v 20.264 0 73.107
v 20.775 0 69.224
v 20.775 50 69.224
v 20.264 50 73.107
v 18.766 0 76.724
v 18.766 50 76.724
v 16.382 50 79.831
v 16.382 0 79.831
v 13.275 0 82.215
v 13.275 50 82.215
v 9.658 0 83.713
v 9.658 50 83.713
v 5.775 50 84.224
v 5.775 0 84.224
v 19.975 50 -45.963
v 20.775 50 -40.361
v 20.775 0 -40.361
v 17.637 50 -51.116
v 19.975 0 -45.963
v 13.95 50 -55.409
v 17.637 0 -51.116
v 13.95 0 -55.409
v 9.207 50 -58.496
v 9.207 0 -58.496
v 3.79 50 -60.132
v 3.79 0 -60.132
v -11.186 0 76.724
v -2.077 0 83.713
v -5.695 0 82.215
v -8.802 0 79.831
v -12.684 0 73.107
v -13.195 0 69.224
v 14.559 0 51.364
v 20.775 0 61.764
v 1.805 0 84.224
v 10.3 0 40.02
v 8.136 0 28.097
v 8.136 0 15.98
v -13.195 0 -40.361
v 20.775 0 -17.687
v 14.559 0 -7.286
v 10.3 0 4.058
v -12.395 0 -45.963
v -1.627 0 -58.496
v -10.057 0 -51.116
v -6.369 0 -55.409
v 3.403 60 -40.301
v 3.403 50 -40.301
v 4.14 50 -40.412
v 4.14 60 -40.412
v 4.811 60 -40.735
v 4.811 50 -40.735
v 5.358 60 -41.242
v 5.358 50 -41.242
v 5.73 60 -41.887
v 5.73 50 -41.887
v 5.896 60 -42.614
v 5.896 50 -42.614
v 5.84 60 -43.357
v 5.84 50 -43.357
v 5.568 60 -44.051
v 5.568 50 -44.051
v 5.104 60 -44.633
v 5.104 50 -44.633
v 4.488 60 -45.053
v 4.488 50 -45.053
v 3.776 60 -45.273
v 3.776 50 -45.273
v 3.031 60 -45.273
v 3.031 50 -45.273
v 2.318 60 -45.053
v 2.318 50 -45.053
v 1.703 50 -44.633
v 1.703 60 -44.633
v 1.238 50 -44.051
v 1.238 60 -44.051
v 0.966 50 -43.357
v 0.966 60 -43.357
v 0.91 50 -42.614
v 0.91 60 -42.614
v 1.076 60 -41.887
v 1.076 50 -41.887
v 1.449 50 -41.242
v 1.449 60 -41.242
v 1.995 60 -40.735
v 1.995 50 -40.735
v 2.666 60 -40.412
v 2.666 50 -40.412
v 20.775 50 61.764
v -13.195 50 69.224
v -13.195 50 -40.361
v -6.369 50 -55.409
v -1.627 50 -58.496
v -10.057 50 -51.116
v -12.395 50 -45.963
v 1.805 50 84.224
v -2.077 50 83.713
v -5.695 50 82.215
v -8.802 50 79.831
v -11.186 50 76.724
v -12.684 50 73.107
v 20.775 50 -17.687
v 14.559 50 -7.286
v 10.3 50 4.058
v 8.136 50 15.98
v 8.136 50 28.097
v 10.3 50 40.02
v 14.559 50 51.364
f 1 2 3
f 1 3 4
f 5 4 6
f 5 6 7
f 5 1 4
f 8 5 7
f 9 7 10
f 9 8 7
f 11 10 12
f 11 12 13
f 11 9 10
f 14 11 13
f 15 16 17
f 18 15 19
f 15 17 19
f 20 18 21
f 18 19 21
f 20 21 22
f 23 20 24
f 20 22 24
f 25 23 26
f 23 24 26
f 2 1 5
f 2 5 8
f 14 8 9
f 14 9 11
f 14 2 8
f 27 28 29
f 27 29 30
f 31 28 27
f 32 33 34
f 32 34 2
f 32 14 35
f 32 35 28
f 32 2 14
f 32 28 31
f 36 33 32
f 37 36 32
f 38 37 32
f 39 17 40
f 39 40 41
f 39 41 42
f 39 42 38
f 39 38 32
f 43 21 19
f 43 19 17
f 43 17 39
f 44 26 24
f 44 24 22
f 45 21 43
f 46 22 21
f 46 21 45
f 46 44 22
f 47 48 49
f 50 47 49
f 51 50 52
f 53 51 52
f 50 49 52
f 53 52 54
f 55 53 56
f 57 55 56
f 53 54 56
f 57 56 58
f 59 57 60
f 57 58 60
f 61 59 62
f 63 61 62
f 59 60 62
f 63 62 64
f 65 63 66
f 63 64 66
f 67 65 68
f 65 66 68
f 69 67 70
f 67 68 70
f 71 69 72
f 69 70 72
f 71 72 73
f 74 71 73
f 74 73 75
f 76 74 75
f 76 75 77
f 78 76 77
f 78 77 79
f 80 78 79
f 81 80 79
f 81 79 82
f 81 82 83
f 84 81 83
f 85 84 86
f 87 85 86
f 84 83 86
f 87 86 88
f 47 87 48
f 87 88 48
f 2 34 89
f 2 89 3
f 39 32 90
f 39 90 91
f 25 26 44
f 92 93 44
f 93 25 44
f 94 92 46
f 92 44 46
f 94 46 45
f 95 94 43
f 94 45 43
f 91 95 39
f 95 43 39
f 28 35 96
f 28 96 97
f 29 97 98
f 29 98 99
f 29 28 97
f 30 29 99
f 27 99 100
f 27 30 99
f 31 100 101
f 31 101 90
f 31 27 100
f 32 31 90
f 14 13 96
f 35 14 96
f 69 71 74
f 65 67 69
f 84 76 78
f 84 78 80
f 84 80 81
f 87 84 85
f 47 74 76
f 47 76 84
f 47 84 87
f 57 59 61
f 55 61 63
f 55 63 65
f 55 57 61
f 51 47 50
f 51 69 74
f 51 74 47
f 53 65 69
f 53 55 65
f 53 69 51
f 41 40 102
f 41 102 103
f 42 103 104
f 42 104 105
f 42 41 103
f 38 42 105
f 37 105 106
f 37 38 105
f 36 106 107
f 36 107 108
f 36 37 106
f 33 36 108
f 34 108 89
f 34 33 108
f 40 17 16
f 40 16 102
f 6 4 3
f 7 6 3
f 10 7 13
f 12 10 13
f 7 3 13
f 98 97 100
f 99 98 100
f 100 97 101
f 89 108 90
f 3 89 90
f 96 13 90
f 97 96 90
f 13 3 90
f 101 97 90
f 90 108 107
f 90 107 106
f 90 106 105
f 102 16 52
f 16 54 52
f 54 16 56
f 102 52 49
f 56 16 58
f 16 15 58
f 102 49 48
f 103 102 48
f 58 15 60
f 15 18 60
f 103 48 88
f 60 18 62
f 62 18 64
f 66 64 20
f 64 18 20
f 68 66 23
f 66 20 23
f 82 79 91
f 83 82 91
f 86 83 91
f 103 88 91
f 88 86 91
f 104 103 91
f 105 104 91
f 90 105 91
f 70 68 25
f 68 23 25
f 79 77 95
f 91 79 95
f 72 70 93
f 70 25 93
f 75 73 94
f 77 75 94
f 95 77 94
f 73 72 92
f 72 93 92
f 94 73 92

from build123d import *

# Parameters (mm, degrees)
EXTRUDE_1_DEPTH = 50
SKETCH_3_R      = 2.5
EXTRUDE_2_DEPTH = 10
FILLET_1_R      = 20


with BuildPart() as part:
    # Эскиз2 → Бобышка-Вытянуть1 (new body)
    with BuildSketch(Plane(origin=(0, 0, 0), x_dir=(1, 0, 0), z_dir=(0, 1, 0))):
        with BuildLine():
            Line((20.775320905, -61.764467554), (20.775320905, -69.224273938))
            ThreePointArc((20.775320905, -69.224273938), (16.381922622, -79.830875656), (5.775320905, -84.224273938))
            Line((5.775320905, -84.224273938), (1.80486375, -84.224273938))
            ThreePointArc((1.80486375, -84.224273938), (-8.801737968, -79.830875656), (-13.19513625, -69.224273938))
            Line((-13.19513625, -69.224273938), (-13.19513625, 60.360729655))
            Line((-13.19513625, 60.360729655), (20.775320905, 60.360729655))
            Line((20.775320905, 60.360729655), (20.775320905, 17.687097527))
            ThreePointArc((20.775320905, 17.687097527), (7.863671927, -22.038685014), (20.775320905, -61.764467554))
        make_face()
    extrude(amount=EXTRUDE_1_DEPTH)

    # Эскиз3 → Бобышка-Вытянуть2 (add)
    with BuildSketch(Plane(origin=(0, 50, 0), x_dir=(1, 0, 0), z_dir=(0, 1, 0))):
        with Locations(Location((3.403106264, 42.800743613, 0), (0, 0, 270))):
            Circle(SKETCH_3_R)
    extrude(amount=EXTRUDE_2_DEPTH)

    # Скругление1
    # the kernel refuses this fillet: 20 mm, written as the material it takes off along each edge
    with BuildSketch(Plane(origin=(-13.19513625, -50, -60.360729655), x_dir=(0, 0, 1), z_dir=(0, 1, 0))) as fillet_1_piece_1:
        with BuildLine():
            CenterArc((FILLET_1_R, FILLET_1_R), FILLET_1_R, 180, 90)
            Line((0, FILLET_1_R), (0, 0))
            Line((0, 0), (FILLET_1_R, 0))
        make_face()
    extrude(amount=150, mode=Mode.SUBTRACT)
    with BuildSketch(Plane(origin=(20.775320905, -50, -60.360729655), x_dir=(0, 0, 1), z_dir=(0, 1, 0))) as fillet_1_piece_2:
        with BuildLine():
            CenterArc((FILLET_1_R, -FILLET_1_R), FILLET_1_R, 90, 90)
            Line((0, -FILLET_1_R), (0, 0))
            Line((0, 0), (FILLET_1_R, 0))
        make_face()
    extrude(amount=150, mode=Mode.SUBTRACT)


solid = part.part
